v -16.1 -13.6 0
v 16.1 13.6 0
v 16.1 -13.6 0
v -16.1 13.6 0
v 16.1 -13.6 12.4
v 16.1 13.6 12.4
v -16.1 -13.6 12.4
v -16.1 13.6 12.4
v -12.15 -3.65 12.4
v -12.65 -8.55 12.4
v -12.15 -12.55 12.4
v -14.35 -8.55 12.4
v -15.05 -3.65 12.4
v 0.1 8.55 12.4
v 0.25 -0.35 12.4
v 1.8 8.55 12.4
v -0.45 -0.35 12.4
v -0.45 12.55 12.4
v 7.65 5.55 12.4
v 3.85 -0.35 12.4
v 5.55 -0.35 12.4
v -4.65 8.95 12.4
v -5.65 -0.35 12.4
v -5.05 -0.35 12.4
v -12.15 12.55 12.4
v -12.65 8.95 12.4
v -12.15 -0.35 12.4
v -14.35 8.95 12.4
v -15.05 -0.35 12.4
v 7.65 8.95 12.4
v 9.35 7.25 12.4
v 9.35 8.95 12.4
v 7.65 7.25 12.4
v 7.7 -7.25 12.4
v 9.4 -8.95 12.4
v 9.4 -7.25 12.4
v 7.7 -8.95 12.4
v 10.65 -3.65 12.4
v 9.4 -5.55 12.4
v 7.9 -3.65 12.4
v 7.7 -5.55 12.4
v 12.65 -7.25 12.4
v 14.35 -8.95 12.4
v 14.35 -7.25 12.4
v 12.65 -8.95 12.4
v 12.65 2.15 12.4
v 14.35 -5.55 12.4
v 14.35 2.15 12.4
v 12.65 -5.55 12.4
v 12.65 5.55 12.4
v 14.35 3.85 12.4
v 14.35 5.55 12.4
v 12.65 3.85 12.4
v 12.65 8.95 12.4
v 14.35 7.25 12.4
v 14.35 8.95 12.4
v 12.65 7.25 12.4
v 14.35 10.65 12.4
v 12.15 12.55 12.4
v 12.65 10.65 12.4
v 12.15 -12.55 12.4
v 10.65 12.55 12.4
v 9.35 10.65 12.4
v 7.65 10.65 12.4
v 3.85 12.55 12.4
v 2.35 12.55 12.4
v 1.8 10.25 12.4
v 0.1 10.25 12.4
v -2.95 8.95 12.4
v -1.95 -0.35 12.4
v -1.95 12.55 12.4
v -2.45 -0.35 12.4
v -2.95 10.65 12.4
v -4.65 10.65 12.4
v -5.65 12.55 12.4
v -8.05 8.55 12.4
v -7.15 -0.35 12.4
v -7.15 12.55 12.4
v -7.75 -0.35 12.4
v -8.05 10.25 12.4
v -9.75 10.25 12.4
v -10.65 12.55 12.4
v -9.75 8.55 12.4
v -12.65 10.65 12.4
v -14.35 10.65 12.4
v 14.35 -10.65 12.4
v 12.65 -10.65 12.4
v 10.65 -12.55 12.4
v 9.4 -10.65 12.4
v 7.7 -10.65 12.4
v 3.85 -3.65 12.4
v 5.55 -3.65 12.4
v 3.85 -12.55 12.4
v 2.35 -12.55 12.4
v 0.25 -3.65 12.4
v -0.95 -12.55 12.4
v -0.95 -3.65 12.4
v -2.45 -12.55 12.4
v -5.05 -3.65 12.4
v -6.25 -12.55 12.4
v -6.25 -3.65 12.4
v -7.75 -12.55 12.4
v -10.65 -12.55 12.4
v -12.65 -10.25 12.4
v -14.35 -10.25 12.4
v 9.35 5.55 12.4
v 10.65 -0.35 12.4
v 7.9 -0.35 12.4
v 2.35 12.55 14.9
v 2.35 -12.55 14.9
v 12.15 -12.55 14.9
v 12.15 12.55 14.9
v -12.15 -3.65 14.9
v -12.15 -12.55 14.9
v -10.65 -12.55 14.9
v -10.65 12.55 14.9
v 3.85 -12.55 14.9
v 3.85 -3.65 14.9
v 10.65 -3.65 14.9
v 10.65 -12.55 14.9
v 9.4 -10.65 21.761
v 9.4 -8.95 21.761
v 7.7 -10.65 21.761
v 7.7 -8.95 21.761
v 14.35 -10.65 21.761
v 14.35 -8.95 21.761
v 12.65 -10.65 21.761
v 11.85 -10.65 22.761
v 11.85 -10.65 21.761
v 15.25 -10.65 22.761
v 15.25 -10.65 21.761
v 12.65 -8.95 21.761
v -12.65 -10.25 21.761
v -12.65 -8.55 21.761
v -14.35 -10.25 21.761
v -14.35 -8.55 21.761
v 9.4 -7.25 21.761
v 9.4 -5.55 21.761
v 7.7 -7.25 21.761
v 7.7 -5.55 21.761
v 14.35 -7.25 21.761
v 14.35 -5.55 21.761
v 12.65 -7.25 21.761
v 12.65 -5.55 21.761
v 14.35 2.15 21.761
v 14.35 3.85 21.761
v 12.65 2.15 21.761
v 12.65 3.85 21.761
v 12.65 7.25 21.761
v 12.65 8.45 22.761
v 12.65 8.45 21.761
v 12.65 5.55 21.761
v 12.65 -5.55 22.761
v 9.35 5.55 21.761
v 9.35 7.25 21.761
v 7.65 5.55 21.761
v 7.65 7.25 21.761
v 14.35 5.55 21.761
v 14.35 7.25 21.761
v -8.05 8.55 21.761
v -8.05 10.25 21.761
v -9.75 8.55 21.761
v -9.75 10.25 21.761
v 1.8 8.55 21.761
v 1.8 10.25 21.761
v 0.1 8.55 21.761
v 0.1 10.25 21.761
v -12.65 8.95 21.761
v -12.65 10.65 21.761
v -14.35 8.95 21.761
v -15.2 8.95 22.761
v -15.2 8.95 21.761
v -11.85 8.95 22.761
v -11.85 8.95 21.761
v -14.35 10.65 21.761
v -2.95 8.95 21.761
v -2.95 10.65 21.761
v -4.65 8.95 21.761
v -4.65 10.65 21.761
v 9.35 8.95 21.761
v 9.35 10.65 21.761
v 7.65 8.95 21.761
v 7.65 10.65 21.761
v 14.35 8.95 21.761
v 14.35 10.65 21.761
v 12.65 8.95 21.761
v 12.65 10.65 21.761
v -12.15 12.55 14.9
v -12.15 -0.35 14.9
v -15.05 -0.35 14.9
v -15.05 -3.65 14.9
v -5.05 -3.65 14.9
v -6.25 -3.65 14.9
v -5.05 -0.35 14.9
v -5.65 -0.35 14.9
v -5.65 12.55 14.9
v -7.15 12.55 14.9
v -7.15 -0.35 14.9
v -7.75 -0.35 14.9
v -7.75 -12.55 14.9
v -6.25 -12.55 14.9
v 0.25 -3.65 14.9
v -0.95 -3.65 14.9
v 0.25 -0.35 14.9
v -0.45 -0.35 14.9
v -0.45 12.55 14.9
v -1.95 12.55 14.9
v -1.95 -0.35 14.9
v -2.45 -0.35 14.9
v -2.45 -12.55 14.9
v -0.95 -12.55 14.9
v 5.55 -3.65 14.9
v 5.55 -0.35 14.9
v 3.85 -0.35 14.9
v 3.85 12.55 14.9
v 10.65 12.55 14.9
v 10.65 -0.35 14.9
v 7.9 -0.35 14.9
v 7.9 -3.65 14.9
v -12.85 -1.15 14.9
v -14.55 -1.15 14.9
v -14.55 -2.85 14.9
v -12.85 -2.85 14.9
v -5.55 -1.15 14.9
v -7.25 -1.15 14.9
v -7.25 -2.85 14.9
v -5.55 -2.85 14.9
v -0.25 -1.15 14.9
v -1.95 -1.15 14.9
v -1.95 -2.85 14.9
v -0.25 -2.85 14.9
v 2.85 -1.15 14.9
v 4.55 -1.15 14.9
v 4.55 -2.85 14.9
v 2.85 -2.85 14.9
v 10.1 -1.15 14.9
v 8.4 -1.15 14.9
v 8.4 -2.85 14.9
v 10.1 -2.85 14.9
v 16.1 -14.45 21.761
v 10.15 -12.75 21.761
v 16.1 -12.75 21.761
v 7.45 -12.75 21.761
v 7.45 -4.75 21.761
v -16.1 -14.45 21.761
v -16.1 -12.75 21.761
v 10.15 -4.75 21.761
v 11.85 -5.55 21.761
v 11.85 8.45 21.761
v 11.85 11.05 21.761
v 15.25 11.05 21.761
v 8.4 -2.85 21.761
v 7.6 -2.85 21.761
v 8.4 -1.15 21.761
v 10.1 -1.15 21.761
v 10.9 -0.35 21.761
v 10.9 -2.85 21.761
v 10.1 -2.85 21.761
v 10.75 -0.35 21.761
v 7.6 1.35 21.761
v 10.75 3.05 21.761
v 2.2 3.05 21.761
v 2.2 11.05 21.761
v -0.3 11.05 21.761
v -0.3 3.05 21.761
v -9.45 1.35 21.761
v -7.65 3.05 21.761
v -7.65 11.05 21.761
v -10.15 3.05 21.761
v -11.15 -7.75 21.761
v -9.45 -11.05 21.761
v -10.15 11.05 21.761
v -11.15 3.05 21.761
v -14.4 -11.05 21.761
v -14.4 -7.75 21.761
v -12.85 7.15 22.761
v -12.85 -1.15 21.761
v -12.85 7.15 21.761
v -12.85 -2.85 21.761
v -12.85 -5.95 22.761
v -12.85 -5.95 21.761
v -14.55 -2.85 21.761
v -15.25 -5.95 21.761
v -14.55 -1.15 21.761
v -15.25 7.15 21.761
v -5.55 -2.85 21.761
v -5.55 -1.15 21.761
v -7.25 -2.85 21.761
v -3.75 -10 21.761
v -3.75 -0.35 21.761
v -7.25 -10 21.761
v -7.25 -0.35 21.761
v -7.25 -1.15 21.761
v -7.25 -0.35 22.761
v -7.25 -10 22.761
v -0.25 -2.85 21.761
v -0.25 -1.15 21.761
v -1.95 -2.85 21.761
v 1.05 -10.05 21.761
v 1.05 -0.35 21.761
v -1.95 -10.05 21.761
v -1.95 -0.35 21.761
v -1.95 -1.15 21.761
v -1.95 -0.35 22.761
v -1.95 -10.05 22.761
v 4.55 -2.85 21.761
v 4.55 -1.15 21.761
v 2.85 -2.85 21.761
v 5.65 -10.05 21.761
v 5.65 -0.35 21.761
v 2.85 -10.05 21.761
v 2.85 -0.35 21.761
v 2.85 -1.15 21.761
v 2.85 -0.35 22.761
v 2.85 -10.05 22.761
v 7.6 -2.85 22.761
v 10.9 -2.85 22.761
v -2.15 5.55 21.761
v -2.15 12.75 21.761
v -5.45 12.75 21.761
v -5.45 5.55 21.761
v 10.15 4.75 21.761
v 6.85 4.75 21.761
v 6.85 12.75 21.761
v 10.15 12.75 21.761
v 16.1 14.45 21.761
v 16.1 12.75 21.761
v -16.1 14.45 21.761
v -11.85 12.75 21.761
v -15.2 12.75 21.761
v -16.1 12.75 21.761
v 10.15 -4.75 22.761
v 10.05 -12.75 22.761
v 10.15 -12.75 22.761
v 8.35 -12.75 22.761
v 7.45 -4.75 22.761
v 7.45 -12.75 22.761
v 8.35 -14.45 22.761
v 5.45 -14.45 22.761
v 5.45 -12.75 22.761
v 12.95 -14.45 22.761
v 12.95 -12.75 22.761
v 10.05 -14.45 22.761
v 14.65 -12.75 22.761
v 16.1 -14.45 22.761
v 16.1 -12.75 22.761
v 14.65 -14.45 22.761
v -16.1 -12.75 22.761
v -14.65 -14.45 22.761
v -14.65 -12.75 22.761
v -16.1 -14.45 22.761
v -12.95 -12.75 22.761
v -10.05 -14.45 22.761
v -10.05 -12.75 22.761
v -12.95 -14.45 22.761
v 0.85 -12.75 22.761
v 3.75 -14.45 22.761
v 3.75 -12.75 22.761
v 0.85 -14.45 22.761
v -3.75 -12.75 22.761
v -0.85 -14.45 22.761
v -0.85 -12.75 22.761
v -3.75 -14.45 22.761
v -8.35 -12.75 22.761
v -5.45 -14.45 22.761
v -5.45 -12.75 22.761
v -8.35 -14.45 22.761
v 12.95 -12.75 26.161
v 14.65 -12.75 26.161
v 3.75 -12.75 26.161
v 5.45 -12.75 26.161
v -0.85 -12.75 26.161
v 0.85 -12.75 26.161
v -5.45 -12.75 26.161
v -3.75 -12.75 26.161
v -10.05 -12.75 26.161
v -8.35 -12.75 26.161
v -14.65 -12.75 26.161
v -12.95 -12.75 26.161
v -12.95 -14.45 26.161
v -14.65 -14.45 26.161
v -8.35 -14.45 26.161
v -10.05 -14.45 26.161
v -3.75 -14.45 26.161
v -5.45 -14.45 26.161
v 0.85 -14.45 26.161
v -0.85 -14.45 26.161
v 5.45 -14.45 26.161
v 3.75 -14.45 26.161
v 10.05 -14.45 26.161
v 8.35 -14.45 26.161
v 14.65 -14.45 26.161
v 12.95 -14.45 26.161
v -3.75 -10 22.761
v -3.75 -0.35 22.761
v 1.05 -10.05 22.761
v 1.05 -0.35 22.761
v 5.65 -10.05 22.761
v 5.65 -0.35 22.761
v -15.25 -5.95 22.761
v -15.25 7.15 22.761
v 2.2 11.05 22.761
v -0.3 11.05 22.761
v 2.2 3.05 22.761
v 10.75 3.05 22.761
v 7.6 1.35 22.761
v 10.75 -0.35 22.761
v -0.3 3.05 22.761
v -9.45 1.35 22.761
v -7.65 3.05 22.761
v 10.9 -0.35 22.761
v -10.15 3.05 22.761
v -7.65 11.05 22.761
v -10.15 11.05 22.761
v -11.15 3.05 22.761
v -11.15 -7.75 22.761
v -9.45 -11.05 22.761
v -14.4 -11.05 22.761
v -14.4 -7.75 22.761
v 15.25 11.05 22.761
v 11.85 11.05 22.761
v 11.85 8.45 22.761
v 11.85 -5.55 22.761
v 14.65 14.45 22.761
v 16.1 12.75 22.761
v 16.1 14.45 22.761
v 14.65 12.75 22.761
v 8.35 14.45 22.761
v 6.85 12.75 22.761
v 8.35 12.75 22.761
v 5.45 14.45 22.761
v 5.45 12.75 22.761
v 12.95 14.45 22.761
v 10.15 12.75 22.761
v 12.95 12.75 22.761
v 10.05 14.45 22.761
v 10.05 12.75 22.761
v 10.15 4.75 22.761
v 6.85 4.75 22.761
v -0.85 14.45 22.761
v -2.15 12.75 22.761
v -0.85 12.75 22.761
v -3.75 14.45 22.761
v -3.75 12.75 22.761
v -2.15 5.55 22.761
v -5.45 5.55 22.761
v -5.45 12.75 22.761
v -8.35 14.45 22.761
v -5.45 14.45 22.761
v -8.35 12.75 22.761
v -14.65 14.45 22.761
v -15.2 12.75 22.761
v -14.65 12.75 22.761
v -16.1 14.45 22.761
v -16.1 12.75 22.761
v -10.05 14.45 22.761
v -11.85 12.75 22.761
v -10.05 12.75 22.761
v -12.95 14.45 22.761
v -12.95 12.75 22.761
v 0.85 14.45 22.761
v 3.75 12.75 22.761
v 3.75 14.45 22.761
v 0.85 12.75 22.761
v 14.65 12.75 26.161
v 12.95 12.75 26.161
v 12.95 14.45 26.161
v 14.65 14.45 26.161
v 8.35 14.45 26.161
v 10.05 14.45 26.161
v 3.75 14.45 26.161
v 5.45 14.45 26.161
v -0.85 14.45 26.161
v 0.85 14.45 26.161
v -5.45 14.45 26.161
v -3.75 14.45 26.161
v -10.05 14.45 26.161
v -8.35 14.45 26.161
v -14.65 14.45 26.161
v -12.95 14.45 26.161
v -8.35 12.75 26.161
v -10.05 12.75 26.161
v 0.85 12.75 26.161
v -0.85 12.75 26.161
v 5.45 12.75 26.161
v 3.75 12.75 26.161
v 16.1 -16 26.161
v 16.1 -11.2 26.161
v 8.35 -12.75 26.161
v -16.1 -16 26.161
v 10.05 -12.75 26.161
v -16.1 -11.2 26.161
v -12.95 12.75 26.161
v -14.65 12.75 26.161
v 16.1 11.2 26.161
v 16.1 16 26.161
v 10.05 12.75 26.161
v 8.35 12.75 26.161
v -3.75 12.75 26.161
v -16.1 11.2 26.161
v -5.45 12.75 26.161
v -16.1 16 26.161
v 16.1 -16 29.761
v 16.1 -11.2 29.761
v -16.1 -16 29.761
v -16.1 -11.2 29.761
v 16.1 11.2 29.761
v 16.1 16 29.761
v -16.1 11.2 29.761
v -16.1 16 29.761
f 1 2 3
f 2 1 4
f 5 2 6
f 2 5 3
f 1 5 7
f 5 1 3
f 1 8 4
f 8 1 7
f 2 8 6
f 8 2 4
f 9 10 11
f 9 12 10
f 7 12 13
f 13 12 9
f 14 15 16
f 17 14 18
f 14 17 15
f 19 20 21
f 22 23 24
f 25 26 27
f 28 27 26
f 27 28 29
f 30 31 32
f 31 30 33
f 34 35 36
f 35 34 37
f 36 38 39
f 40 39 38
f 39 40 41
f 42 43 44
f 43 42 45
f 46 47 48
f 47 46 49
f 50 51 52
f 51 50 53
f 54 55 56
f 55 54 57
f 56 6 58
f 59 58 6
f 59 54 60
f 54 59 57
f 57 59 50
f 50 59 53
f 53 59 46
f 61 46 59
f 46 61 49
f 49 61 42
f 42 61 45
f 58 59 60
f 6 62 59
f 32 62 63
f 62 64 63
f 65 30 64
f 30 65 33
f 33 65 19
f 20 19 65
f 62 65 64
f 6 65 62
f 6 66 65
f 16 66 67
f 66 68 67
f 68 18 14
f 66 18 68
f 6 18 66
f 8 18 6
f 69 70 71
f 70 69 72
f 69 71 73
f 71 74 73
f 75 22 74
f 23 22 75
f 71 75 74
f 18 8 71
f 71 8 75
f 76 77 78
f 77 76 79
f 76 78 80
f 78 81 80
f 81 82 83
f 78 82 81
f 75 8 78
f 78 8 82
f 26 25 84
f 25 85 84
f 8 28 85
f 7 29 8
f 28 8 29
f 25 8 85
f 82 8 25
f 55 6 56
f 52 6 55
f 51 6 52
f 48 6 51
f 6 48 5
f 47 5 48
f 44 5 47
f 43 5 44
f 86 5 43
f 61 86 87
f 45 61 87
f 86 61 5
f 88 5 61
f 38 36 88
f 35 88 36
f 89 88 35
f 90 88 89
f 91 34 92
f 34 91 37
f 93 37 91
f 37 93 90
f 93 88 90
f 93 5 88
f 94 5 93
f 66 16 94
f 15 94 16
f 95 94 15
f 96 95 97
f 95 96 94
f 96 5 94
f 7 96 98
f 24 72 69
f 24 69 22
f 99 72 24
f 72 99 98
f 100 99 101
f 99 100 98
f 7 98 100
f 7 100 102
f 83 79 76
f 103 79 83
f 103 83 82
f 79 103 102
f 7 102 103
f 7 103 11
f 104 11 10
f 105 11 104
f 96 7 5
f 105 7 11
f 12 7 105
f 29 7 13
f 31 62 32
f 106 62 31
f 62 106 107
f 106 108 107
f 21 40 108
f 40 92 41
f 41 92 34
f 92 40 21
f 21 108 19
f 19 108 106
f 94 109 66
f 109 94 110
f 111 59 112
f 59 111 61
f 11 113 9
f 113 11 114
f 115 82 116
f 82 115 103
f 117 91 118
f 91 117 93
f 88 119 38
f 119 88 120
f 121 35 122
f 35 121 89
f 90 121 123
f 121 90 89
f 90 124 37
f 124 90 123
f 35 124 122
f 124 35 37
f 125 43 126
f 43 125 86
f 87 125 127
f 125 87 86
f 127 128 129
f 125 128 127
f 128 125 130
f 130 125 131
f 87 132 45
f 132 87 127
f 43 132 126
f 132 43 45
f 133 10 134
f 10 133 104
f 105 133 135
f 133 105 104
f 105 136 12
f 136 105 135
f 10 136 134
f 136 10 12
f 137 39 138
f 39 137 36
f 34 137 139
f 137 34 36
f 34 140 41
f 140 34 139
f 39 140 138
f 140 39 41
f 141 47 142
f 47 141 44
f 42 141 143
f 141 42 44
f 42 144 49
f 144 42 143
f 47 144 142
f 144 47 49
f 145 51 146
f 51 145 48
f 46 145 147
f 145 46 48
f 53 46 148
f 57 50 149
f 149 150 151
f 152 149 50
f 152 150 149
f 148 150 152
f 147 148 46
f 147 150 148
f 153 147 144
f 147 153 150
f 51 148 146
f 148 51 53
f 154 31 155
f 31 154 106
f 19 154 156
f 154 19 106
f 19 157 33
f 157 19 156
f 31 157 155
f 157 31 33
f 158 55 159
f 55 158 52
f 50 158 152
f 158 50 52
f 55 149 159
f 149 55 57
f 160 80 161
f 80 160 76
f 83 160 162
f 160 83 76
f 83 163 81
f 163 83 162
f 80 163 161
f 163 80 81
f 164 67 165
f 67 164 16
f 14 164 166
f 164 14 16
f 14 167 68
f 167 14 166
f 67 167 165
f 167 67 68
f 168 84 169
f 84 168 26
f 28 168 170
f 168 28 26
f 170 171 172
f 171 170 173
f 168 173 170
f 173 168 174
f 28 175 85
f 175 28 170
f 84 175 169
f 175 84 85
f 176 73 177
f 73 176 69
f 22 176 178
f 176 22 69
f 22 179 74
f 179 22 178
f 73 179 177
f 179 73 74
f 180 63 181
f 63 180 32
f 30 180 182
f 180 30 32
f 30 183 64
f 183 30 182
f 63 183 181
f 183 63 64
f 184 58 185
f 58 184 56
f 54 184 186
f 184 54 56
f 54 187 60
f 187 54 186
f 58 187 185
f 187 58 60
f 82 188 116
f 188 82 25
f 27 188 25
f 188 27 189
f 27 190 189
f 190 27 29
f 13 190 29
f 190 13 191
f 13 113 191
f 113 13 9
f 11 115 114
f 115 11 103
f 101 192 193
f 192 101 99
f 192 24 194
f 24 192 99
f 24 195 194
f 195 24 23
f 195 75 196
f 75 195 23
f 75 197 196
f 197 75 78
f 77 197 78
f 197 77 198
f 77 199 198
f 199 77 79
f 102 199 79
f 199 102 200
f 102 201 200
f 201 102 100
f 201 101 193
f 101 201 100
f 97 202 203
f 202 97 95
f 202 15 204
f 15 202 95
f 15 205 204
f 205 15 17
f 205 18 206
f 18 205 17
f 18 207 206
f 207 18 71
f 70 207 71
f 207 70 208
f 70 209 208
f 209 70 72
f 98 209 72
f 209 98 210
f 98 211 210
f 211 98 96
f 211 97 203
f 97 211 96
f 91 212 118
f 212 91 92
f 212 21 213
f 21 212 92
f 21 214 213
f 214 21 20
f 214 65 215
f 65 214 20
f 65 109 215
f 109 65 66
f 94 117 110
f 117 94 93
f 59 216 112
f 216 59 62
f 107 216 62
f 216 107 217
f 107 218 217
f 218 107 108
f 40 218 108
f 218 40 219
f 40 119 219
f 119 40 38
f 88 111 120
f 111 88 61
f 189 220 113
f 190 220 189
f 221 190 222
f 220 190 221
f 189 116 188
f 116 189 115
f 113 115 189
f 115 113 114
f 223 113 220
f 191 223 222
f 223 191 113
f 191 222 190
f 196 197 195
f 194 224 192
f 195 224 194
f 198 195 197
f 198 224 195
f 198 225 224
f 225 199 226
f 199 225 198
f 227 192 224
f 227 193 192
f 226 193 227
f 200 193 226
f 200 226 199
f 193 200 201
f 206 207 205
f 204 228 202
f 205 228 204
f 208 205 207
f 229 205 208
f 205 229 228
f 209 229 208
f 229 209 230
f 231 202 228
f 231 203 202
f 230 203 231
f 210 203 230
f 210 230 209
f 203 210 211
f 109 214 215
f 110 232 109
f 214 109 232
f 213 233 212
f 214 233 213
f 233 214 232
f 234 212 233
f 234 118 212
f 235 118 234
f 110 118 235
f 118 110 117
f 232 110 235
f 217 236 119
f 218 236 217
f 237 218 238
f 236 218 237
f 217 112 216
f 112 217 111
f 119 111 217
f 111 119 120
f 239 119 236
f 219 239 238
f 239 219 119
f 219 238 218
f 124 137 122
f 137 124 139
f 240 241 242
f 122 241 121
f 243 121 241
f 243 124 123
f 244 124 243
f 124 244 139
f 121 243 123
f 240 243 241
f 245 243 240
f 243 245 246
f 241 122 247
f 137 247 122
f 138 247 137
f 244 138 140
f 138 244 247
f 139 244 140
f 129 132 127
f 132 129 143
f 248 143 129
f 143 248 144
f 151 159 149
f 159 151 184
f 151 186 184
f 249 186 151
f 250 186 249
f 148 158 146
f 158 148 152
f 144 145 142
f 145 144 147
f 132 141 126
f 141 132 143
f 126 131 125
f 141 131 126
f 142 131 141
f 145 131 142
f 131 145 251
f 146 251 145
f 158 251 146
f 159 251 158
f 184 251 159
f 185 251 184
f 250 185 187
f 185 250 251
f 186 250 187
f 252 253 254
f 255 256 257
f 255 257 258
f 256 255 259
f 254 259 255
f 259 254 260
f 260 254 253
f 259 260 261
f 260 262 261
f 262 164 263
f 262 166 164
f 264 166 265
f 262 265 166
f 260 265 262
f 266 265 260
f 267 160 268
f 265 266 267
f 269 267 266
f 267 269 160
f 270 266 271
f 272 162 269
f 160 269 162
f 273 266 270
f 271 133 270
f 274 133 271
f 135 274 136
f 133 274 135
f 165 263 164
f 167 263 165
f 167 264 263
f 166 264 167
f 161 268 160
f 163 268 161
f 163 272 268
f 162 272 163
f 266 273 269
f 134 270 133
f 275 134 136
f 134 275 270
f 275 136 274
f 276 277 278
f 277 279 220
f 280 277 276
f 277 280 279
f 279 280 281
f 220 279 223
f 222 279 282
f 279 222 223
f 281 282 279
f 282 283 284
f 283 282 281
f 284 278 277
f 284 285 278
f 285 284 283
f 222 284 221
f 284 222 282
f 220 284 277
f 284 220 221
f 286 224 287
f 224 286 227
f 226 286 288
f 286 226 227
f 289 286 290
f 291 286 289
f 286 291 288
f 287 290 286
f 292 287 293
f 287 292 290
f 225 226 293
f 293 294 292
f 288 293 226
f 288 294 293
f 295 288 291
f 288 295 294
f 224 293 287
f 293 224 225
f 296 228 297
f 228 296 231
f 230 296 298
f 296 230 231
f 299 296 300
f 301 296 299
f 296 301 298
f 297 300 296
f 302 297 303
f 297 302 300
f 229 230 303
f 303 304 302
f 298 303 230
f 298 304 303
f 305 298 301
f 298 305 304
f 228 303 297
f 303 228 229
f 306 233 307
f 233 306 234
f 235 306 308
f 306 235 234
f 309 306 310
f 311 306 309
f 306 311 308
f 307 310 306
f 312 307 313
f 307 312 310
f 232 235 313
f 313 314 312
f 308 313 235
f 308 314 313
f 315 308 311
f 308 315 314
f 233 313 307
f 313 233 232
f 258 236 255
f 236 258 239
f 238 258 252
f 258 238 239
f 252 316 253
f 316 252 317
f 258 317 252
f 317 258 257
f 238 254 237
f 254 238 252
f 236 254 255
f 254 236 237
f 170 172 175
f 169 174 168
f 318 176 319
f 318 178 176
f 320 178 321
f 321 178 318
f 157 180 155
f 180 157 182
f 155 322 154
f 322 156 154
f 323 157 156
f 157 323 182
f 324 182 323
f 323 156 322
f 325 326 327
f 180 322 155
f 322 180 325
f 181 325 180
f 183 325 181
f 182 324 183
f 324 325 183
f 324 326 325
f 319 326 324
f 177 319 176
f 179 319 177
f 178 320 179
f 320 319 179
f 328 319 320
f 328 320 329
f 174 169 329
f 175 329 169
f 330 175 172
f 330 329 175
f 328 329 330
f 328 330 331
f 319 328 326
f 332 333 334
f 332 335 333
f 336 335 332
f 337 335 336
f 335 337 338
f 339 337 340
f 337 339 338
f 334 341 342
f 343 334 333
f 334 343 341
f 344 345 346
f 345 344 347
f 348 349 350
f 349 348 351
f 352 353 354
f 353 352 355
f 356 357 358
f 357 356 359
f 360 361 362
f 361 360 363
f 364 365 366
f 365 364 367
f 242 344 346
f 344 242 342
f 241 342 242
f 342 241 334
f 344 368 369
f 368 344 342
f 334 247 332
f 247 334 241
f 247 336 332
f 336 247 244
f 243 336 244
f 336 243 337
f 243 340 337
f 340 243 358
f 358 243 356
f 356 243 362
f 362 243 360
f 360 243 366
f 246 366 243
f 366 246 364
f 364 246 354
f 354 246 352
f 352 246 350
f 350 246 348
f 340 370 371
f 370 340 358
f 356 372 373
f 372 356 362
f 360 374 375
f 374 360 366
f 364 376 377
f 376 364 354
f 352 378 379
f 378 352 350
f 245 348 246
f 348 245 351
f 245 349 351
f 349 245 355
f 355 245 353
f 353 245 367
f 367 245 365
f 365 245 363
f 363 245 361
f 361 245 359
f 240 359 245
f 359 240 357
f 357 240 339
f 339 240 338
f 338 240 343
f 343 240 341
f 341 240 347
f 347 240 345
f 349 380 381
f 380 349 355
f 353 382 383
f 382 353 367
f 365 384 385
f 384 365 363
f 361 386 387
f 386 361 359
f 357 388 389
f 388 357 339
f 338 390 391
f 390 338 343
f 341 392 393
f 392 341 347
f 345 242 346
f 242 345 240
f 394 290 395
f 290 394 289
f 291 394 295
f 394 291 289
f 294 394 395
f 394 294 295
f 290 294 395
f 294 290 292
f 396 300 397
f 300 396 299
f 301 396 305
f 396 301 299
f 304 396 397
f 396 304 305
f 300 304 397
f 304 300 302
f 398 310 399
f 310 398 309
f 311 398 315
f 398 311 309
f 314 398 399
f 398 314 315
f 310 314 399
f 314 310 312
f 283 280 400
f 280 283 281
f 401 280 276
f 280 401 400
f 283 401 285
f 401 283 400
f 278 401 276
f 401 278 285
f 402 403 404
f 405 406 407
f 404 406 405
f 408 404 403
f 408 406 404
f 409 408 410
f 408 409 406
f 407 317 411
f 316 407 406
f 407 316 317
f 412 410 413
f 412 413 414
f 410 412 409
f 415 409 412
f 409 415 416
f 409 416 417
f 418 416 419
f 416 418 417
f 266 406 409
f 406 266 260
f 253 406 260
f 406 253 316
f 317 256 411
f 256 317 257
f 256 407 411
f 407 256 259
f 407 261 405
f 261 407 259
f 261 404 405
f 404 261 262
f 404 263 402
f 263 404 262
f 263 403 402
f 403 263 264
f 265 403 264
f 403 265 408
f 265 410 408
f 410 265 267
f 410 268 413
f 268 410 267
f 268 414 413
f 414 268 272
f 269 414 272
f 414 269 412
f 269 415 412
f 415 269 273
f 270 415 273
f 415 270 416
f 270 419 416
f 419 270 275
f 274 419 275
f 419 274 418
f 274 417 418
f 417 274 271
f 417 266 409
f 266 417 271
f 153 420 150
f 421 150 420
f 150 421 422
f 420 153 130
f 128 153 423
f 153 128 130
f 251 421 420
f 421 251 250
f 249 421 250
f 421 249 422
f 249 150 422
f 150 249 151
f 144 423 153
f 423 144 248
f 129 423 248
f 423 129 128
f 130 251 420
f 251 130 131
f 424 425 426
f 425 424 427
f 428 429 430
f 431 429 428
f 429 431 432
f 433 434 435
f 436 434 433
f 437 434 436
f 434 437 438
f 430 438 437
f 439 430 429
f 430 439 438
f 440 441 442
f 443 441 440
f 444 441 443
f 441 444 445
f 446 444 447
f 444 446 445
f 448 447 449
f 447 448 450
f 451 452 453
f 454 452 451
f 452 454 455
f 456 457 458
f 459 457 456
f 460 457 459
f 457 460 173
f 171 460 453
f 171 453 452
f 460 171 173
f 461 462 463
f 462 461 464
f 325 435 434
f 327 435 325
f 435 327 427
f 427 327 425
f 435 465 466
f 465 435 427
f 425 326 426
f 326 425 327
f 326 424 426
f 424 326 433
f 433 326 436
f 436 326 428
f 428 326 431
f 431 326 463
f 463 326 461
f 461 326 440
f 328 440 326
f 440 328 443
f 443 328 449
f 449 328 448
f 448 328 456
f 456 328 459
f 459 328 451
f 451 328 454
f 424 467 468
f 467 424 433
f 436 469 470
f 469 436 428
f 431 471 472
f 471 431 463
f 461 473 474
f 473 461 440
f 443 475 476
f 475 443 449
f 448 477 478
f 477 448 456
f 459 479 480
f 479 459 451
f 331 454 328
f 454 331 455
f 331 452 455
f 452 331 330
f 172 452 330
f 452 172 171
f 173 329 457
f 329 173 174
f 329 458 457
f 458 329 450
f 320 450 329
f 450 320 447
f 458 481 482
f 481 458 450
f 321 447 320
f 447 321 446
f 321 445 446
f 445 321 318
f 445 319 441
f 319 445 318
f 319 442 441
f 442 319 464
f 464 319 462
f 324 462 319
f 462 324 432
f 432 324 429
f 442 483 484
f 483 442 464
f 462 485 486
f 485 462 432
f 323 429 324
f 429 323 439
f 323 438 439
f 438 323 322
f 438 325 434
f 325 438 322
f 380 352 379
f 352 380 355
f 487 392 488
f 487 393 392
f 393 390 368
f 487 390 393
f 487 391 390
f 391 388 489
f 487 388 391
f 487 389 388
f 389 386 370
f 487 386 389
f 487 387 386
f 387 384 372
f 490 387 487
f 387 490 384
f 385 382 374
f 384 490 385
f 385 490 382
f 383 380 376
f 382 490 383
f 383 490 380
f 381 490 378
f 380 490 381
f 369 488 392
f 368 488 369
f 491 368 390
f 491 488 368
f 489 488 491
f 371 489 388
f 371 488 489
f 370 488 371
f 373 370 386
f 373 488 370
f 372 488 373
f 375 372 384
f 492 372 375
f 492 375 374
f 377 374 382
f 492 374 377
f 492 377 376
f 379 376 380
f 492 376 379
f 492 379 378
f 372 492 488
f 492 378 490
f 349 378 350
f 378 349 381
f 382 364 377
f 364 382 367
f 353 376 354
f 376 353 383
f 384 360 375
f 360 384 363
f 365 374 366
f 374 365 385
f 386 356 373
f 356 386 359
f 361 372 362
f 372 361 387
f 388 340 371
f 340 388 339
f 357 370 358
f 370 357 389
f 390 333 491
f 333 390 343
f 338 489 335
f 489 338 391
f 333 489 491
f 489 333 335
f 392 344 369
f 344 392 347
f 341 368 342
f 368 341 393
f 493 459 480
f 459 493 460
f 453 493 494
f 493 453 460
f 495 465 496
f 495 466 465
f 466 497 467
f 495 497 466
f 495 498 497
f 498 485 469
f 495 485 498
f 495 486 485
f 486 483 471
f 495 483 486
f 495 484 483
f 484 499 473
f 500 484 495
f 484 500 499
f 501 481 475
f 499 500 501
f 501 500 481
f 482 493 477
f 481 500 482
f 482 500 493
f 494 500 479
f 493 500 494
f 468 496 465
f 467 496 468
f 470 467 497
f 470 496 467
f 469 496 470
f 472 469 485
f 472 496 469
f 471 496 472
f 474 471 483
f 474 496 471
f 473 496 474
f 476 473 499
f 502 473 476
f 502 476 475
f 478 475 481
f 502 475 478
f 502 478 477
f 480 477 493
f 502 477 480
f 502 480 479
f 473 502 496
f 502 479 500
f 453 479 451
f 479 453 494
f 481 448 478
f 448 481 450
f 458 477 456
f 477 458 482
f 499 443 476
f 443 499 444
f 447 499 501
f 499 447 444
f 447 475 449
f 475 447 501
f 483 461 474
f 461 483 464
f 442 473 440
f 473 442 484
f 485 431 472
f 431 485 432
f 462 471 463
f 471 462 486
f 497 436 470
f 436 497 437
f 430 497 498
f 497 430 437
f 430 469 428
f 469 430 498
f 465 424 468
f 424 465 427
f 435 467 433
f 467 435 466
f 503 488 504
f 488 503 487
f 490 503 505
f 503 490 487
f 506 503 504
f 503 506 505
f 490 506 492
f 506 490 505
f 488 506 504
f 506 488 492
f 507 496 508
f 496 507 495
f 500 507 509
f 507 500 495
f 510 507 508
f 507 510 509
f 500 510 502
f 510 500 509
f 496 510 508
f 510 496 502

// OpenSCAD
// Generated by SolidPython 0.4.2 on 2020-09-29 23:20:11
//!OpenSCAD

scale(v = 0.0100000000) {
	translate(v = [-1610, -1360, 0]) {
		union() {
			color(c = [0.4000000000, 0.4000000000, 0.4000000000]) {
				translate(v = [0, 0, 0]) {
					linear_extrude(height = 1000.0000000000) {
						polygon(paths = [[0, 1, 2, 3]], points = [[0, 0], [0, 2720], [3220, 2720], [3220, 0]]);
					}
				}
			}
			color(c = [0.2000000000, 0.6000000000, 0.2000000000]) {
				translate(v = [0, 0, 1000.0000000000]) {
					linear_extrude(height = 120.0000000000) {
						polygon(paths = [[0, 1, 2, 3]], points = [[0, 1305], [0, 2720], [3220, 2720], [3220, 1305]]);
					}
				}
			}
			color(c = [0.4000000000, 0.4000000000, 0.4000000000]) {
				translate(v = [0, 0, 1000.0000000000]) {
					linear_extrude(height = 120.0000000000) {
						polygon(paths = [[0, 1, 2, 3]], points = [[0, 0], [0, 1305], [3220, 1305], [3220, 0]]);
					}
				}
			}
			color(c = [0.9000000000, 0.6000000000, 0.6000000000]) {
				translate(v = [0, 0, 1120.0000000000]) {
					linear_extrude(height = 120.0000000000) {
						polygon(paths = [[0, 1, 2, 3]], points = [[135, 2065], [135, 2485], [395, 2485], [395, 2065]]);
					}
				}
			}
			color(c = [0.9000000000, 0.6000000000, 0.6000000000]) {
				translate(v = [0, 0, 1120.0000000000]) {
					linear_extrude(height = 120.0000000000) {
						polygon(paths = [[0, 1, 2, 3]], points = [[545, 2065], [545, 2485], [895, 2485], [895, 2065]]);
					}
				}
			}
			color(c = [0.9000000000, 0.6000000000, 0.6000000000]) {
				translate(v = [0, 0, 1120.0000000000]) {
					linear_extrude(height = 120.0000000000) {
						polygon(paths = [[0, 1, 2, 3]], points = [[1045, 2065], [1045, 2485], [1415, 2485], [1415, 2065]]);
					}
				}
			}
			color(c = [0.9000000000, 0.6000000000, 0.6000000000]) {
				translate(v = [0, 0, 1120.0000000000]) {
					linear_extrude(height = 120.0000000000) {
						polygon(paths = [[0, 1, 2, 3]], points = [[1565, 2065], [1565, 2485], [1845, 2485], [1845, 2065]]);
					}
				}
			}
			color(c = [0.9000000000, 0.6000000000, 0.6000000000]) {
				translate(v = [0, 0, 1120.0000000000]) {
					linear_extrude(height = 120.0000000000) {
						polygon(paths = [[0, 1, 2, 3, 4, 5]], points = [[2090, 1485], [2090, 2065], [1995, 2065], [1995, 2485], [2675, 2485], [2675, 1485]]);
					}
				}
			}
			color(c = [0.9000000000, 0.6000000000, 0.6000000000]) {
				translate(v = [0, 0, 1120.0000000000]) {
					linear_extrude(height = 120.0000000000) {
						polygon(paths = [[0, 1, 2, 3]], points = [[2825, 1485], [2825, 2485], [3085, 2485], [3085, 1485]]);
					}
				}
			}
			color(c = [0.9000000000, 0.6000000000, 0.9000000000]) {
				translate(v = [0, 0, 1120.0000000000]) {
					linear_extrude(height = 120.0000000000) {
						polygon(paths = [[0, 1, 2, 3]], points = [[135, 235], [135, 655], [395, 655], [395, 235]]);
					}
				}
			}
			color(c = [0.9000000000, 0.6000000000, 0.9000000000]) {
				translate(v = [0, 0, 1120.0000000000]) {
					linear_extrude(height = 120.0000000000) {
						polygon(paths = [[0, 1, 2, 3]], points = [[545, 235], [545, 655], [835, 655], [835, 235]]);
					}
				}
			}
			color(c = [0.9000000000, 0.6000000000, 0.9000000000]) {
				translate(v = [0, 0, 1120.0000000000]) {
					linear_extrude(height = 120.0000000000) {
						polygon(paths = [[0, 1, 2, 3]], points = [[985, 235], [985, 655], [1365, 655], [1365, 235]]);
					}
				}
			}
			color(c = [0.9000000000, 0.6000000000, 0.9000000000]) {
				translate(v = [0, 0, 1120.0000000000]) {
					linear_extrude(height = 120.0000000000) {
						polygon(paths = [[0, 1, 2, 3]], points = [[1515, 235], [1515, 655], [1845, 655], [1845, 235]]);
					}
				}
			}
			color(c = [0.9000000000, 0.6000000000, 0.9000000000]) {
				translate(v = [0, 0, 1120.0000000000]) {
					linear_extrude(height = 120.0000000000) {
						polygon(paths = [[0, 1, 2, 3, 4, 5]], points = [[1995, 235], [1995, 655], [2210, 655], [2210, 885], [2675, 885], [2675, 235]]);
					}
				}
			}
			color(c = [0.9000000000, 0.6000000000, 0.9000000000]) {
				translate(v = [0, 0, 1120.0000000000]) {
					linear_extrude(height = 120.0000000000) {
						polygon(paths = [[0, 1, 2, 3]], points = [[2825, 235], [2825, 885], [3085, 885], [3085, 235]]);
					}
				}
			}
			color(c = [0.2000000000, 0.6000000000, 0.2000000000]) {
				translate(v = [0, 0, 1120.0000000000]) {
					linear_extrude(height = 120.0000000000) {
						difference() {
							polygon(paths = [[0, 1, 2, 3]], points = [[0, 1305], [0, 2720], [3220, 2720], [3220, 1305]]);
							polygon(paths = [[0, 1, 2, 3]], points = [[2825, 1485], [3085, 1485], [3085, 2485], [2825, 2485]]);
							polygon(paths = [[0, 1, 2, 3]], points = [[135, 2065], [395, 2065], [395, 2485], [135, 2485]]);
							polygon(paths = [[0, 1, 2, 3]], points = [[545, 2065], [895, 2065], [895, 2485], [545, 2485]]);
							polygon(paths = [[0, 1, 2, 3]], points = [[1045, 2065], [1415, 2065], [1415, 2485], [1045, 2485]]);
							polygon(paths = [[0, 1, 2, 3]], points = [[1565, 2065], [1845, 2065], [1845, 2485], [1565, 2485]]);
							polygon(paths = [[0, 1, 2, 3, 4, 5]], points = [[2090, 1485], [2675, 1485], [2675, 2485], [1995, 2485], [1995, 2065], [2090, 2065]]);
						}
					}
				}
			}
			color(c = [0.4000000000, 0.4000000000, 0.4000000000]) {
				translate(v = [0, 0, 1120.0000000000]) {
					linear_extrude(height = 120.0000000000) {
						difference() {
							polygon(paths = [[0, 1, 2, 3]], points = [[0, 0], [0, 1305], [3220, 1305], [3220, 0]]);
							polygon(paths = [[0, 1, 2, 3]], points = [[135, 235], [395, 235], [395, 655], [135, 655]]);
							polygon(paths = [[0, 1, 2, 3]], points = [[545, 235], [835, 235], [835, 655], [545, 655]]);
							polygon(paths = [[0, 1, 2, 3]], points = [[985, 235], [1365, 235], [1365, 655], [985, 655]]);
							polygon(paths = [[0, 1, 2, 3]], points = [[1515, 235], [1845, 235], [1845, 655], [1515, 655]]);
							polygon(paths = [[0, 1, 2, 3]], points = [[2825, 235], [3085, 235], [3085, 885], [2825, 885]]);
							polygon(paths = [[0, 1, 2, 3, 4, 5]], points = [[1995, 235], [2675, 235], [2675, 885], [2210, 885], [2210, 655], [1995, 655]]);
						}
					}
				}
			}
			color(c = [0.1000000000, 0.1000000000, 0.1000000000]) {
				translate(v = [0, 0, 1240.0000000000]) {
					linear_extrude(height = 70.0000000000) {
						polygon(paths = [[0, 1, 2, 3]], points = [[2380, 295], [2380, 465], [2550, 465], [2550, 295]]);
					}
				}
			}
			color(c = [0.1000000000, 0.1000000000, 0.1000000000]) {
				translate(v = [0, 0, 1240.0000000000]) {
					linear_extrude(height = 70.0000000000) {
						polygon(paths = [[0, 1, 2, 3]], points = [[2875, 295], [2875, 465], [3045, 465], [3045, 295]]);
					}
				}
			}
			color(c = [0.1000000000, 0.1000000000, 0.1000000000]) {
				translate(v = [0, 0, 1240.0000000000]) {
					linear_extrude(height = 70.0000000000) {
						polygon(paths = [[0, 1, 2, 3]], points = [[175, 335], [175, 505], [345, 505], [345, 335]]);
					}
				}
			}
			color(c = [0.1000000000, 0.1000000000, 0.1000000000]) {
				translate(v = [0, 0, 1240.0000000000]) {
					linear_extrude(height = 70.0000000000) {
						polygon(paths = [[0, 1, 2, 3]], points = [[2380, 635], [2380, 805], [2550, 805], [2550, 635]]);
					}
				}
			}
			color(c = [0.1000000000, 0.1000000000, 0.1000000000]) {
				translate(v = [0, 0, 1240.0000000000]) {
					linear_extrude(height = 70.0000000000) {
						polygon(paths = [[0, 1, 2, 3]], points = [[2875, 635], [2875, 805], [3045, 805], [3045, 635]]);
					}
				}
			}
			color(c = [0.1000000000, 0.1000000000, 0.1000000000]) {
				translate(v = [0, 0, 1240.0000000000]) {
					linear_extrude(height = 70.0000000000) {
						polygon(paths = [[0, 1, 2, 3]], points = [[2875, 1575], [2875, 1745], [3045, 1745], [3045, 1575]]);
					}
				}
			}
			color(c = [0.1000000000, 0.1000000000, 0.1000000000]) {
				translate(v = [0, 0, 1240.0000000000]) {
					linear_extrude(height = 70.0000000000) {
						polygon(paths = [[0, 1, 2, 3]], points = [[2375, 1915], [2375, 2085], [2545, 2085], [2545, 1915]]);
					}
				}
			}
			color(c = [0.1000000000, 0.1000000000, 0.1000000000]) {
				translate(v = [0, 0, 1240.0000000000]) {
					linear_extrude(height = 70.0000000000) {
						polygon(paths = [[0, 1, 2, 3]], points = [[2875, 1915], [2875, 2085], [3045, 2085], [3045, 1915]]);
					}
				}
			}
			color(c = [0.1000000000, 0.1000000000, 0.1000000000]) {
				translate(v = [0, 0, 1240.0000000000]) {
					linear_extrude(height = 70.0000000000) {
						polygon(paths = [[0, 1, 2, 3]], points = [[635, 2215], [635, 2385], [805, 2385], [805, 2215]]);
					}
				}
			}
			color(c = [0.1000000000, 0.1000000000, 0.1000000000]) {
				translate(v = [0, 0, 1240.0000000000]) {
					linear_extrude(height = 70.0000000000) {
						polygon(paths = [[0, 1, 2, 3]], points = [[1620, 2215], [1620, 2385], [1790, 2385], [1790, 2215]]);
					}
				}
			}
			color(c = [0.1000000000, 0.1000000000, 0.1000000000]) {
				translate(v = [0, 0, 1240.0000000000]) {
					linear_extrude(height = 70.0000000000) {
						polygon(paths = [[0, 1, 2, 3]], points = [[175, 2255], [175, 2425], [345, 2425], [345, 2255]]);
					}
				}
			}
			color(c = [0.1000000000, 0.1000000000, 0.1000000000]) {
				translate(v = [0, 0, 1240.0000000000]) {
					linear_extrude(height = 70.0000000000) {
						polygon(paths = [[0, 1, 2, 3]], points = [[1145, 2255], [1145, 2425], [1315, 2425], [1315, 2255]]);
					}
				}
			}
			color(c = [0.1000000000, 0.1000000000, 0.1000000000]) {
				translate(v = [0, 0, 1240.0000000000]) {
					linear_extrude(height = 70.0000000000) {
						polygon(paths = [[0, 1, 2, 3]], points = [[2375, 2255], [2375, 2425], [2545, 2425], [2545, 2255]]);
					}
				}
			}
			color(c = [0.1000000000, 0.1000000000, 0.1000000000]) {
				translate(v = [0, 0, 1240.0000000000]) {
					linear_extrude(height = 70.0000000000) {
						polygon(paths = [[0, 1, 2, 3]], points = [[2875, 2255], [2875, 2425], [3045, 2425], [3045, 2255]]);
					}
				}
			}
			color(c = [1.0000000000, 1.0000000000, 1.0000000000]) {
				translate(v = [0, 0, 1240.0000000000]) {
					linear_extrude(height = 70.0000000000) {
						polygon(paths = [[0, 1, 2, 3, 4, 5, 6, 7]], points = [[395, 105], [395, 995], [105, 995], [105, 1325], [395, 1325], [395, 2615], [545, 2615], [545, 105]]);
					}
				}
			}
			color(c = [1.0000000000, 1.0000000000, 1.0000000000]) {
				translate(v = [0, 0, 1240.0000000000]) {
					linear_extrude(height = 70.0000000000) {
						polygon(paths = [[0, 1, 2, 3, 4, 5, 6, 7, 8, 9]], points = [[835, 105], [835, 1325], [895, 1325], [895, 2615], [1045, 2615], [1045, 1325], [1105, 1325], [1105, 995], [985, 995], [985, 105]]);
					}
				}
			}
			color(c = [1.0000000000, 1.0000000000, 1.0000000000]) {
				translate(v = [0, 0, 1240.0000000000]) {
					linear_extrude(height = 70.0000000000) {
						polygon(paths = [[0, 1, 2, 3, 4, 5, 6, 7, 8, 9]], points = [[1365, 105], [1365, 1325], [1415, 1325], [1415, 2615], [1565, 2615], [1565, 1325], [1635, 1325], [1635, 995], [1515, 995], [1515, 105]]);
					}
				}
			}
			color(c = [1.0000000000, 1.0000000000, 1.0000000000]) {
				translate(v = [0, 0, 1240.0000000000]) {
					linear_extrude(height = 70.0000000000) {
						polygon(paths = [[0, 1, 2, 3, 4, 5, 6, 7]], points = [[1845, 105], [1845, 2615], [1995, 2615], [1995, 1325], [2165, 1325], [2165, 995], [1995, 995], [1995, 105]]);
					}
				}
			}
			color(c = [1.0000000000, 1.0000000000, 1.0000000000]) {
				translate(v = [0, 0, 1240.0000000000]) {
					linear_extrude(height = 70.0000000000) {
						polygon(paths = [[0, 1, 2, 3, 4, 5, 6, 7]], points = [[2675, 105], [2675, 995], [2400, 995], [2400, 1325], [2675, 1325], [2675, 2615], [2825, 2615], [2825, 105]]);
					}
				}
			}
			color(c = [0.1000000000, 0.1000000000, 0.1000000000]) {
				translate(v = [0, 0, 1310.0000000000]) {
					linear_extrude(height = 180.0000000000) {
						polygon(paths = [[0, 1, 2, 3]], points = [[2380, 295], [2380, 465], [2550, 465], [2550, 295]]);
					}
				}
			}
			color(c = [0.1000000000, 0.1000000000, 0.1000000000]) {
				translate(v = [0, 0, 1310.0000000000]) {
					linear_extrude(height = 180.0000000000) {
						polygon(paths = [[0, 1, 2, 3]], points = [[2875, 295], [2875, 465], [3045, 465], [3045, 295]]);
					}
				}
			}
			color(c = [0.1000000000, 0.1000000000, 0.1000000000]) {
				translate(v = [0, 0, 1310.0000000000]) {
					linear_extrude(height = 180.0000000000) {
						polygon(paths = [[0, 1, 2, 3]], points = [[175, 335], [175, 505], [345, 505], [345, 335]]);
					}
				}
			}
			color(c = [0.1000000000, 0.1000000000, 0.1000000000]) {
				translate(v = [0, 0, 1310.0000000000]) {
					linear_extrude(height = 180.0000000000) {
						polygon(paths = [[0, 1, 2, 3]], points = [[2380, 635], [2380, 805], [2550, 805], [2550, 635]]);
					}
				}
			}
			color(c = [0.1000000000, 0.1000000000, 0.1000000000]) {
				translate(v = [0, 0, 1310.0000000000]) {
					linear_extrude(height = 180.0000000000) {
						polygon(paths = [[0, 1, 2, 3]], points = [[2875, 635], [2875, 805], [3045, 805], [3045, 635]]);
					}
				}
			}
			color(c = [0.1000000000, 0.1000000000, 0.1000000000]) {
				translate(v = [0, 0, 1310.0000000000]) {
					linear_extrude(height = 180.0000000000) {
						polygon(paths = [[0, 1, 2, 3]], points = [[2875, 1575], [2875, 1745], [3045, 1745], [3045, 1575]]);
					}
				}
			}
			color(c = [0.1000000000, 0.1000000000, 0.1000000000]) {
				translate(v = [0, 0, 1310.0000000000]) {
					linear_extrude(height = 180.0000000000) {
						polygon(paths = [[0, 1, 2, 3]], points = [[2375, 1915], [2375, 2085], [2545, 2085], [2545, 1915]]);
					}
				}
			}
			color(c = [0.1000000000, 0.1000000000, 0.1000000000]) {
				translate(v = [0, 0, 1310.0000000000]) {
					linear_extrude(height = 180.0000000000) {
						polygon(paths = [[0, 1, 2, 3]], points = [[2875, 1915], [2875, 2085], [3045, 2085], [3045, 1915]]);
					}
				}
			}
			color(c = [0.1000000000, 0.1000000000, 0.1000000000]) {
				translate(v = [0, 0, 1310.0000000000]) {
					linear_extrude(height = 180.0000000000) {
						polygon(paths = [[0, 1, 2, 3]], points = [[635, 2215], [635, 2385], [805, 2385], [805, 2215]]);
					}
				}
			}
			color(c = [0.1000000000, 0.1000000000, 0.1000000000]) {
				translate(v = [0, 0, 1310.0000000000]) {
					linear_extrude(height = 180.0000000000) {
						polygon(paths = [[0, 1, 2, 3]], points = [[1620, 2215], [1620, 2385], [1790, 2385], [1790, 2215]]);
					}
				}
			}
			color(c = [0.1000000000, 0.1000000000, 0.1000000000]) {
				translate(v = [0, 0, 1310.0000000000]) {
					linear_extrude(height = 180.0000000000) {
						polygon(paths = [[0, 1, 2, 3]], points = [[175, 2255], [175, 2425], [345, 2425], [345, 2255]]);
					}
				}
			}
			color(c = [0.1000000000, 0.1000000000, 0.1000000000]) {
				translate(v = [0, 0, 1310.0000000000]) {
					linear_extrude(height = 180.0000000000) {
						polygon(paths = [[0, 1, 2, 3]], points = [[1145, 2255], [1145, 2425], [1315, 2425], [1315, 2255]]);
					}
				}
			}
			color(c = [0.1000000000, 0.1000000000, 0.1000000000]) {
				translate(v = [0, 0, 1310.0000000000]) {
					linear_extrude(height = 180.0000000000) {
						polygon(paths = [[0, 1, 2, 3]], points = [[2375, 2255], [2375, 2425], [2545, 2425], [2545, 2255]]);
					}
				}
			}
			color(c = [0.1000000000, 0.1000000000, 0.1000000000]) {
				translate(v = [0, 0, 1310.0000000000]) {
					linear_extrude(height = 180.0000000000) {
						polygon(paths = [[0, 1, 2, 3]], points = [[2875, 2255], [2875, 2425], [3045, 2425], [3045, 2255]]);
					}
				}
			}
			color(c = [0.7000000000, 0, 0]) {
				translate(v = [0, 0, 1310.0000000000]) {
					linear_extrude(height = 180.0000000000) {
						polygon(paths = [[0, 1, 2, 3, 4, 5, 6, 7]], points = [[395, 105], [395, 995], [105, 995], [105, 1325], [395, 1325], [395, 2615], [545, 2615], [545, 105]]);
					}
				}
			}
			color(c = [0.7000000000, 0, 0]) {
				translate(v = [0, 0, 1310.0000000000]) {
					linear_extrude(height = 180.0000000000) {
						polygon(paths = [[0, 1, 2, 3, 4, 5, 6, 7, 8, 9]], points = [[835, 105], [835, 1325], [895, 1325], [895, 2615], [1045, 2615], [1045, 1325], [1105, 1325], [1105, 995], [985, 995], [985, 105]]);
					}
				}
			}
			color(c = [0.7000000000, 0, 0]) {
				translate(v = [0, 0, 1310.0000000000]) {
					linear_extrude(height = 180.0000000000) {
						polygon(paths = [[0, 1, 2, 3, 4, 5, 6, 7, 8, 9]], points = [[1365, 105], [1365, 1325], [1415, 1325], [1415, 2615], [1565, 2615], [1565, 1325], [1635, 1325], [1635, 995], [1515, 995], [1515, 105]]);
					}
				}
			}
			color(c = [0.7000000000, 0, 0]) {
				translate(v = [0, 0, 1310.0000000000]) {
					linear_extrude(height = 180.0000000000) {
						polygon(paths = [[0, 1, 2, 3, 4, 5, 6, 7]], points = [[1845, 105], [1845, 2615], [1995, 2615], [1995, 1325], [2165, 1325], [2165, 995], [1995, 995], [1995, 105]]);
					}
				}
			}
			color(c = [0.7000000000, 0, 0]) {
				translate(v = [0, 0, 1310.0000000000]) {
					linear_extrude(height = 180.0000000000) {
						polygon(paths = [[0, 1, 2, 3, 4, 5, 6, 7]], points = [[2675, 105], [2675, 995], [2400, 995], [2400, 1325], [2675, 1325], [2675, 2615], [2825, 2615], [2825, 105]]);
					}
				}
			}
			color(c = [0.1000000000, 0.1000000000, 0.1000000000]) {
				translate(v = [0, 0, 1490.0000000000]) {
					linear_extrude(height = 686.1000000000) {
						polygon(paths = [[0, 1, 2, 3]], points = [[2380, 295], [2380, 465], [2550, 465], [2550, 295]]);
					}
				}
			}
			color(c = [0.1000000000, 0.1000000000, 0.1000000000]) {
				translate(v = [0, 0, 1490.0000000000]) {
					linear_extrude(height = 686.1000000000) {
						polygon(paths = [[0, 1, 2, 3]], points = [[2875, 295], [2875, 465], [3045, 465], [3045, 295]]);
					}
				}
			}
			color(c = [0.1000000000, 0.1000000000, 0.1000000000]) {
				translate(v = [0, 0, 1490.0000000000]) {
					linear_extrude(height = 686.1000000000) {
						polygon(paths = [[0, 1, 2, 3]], points = [[175, 335], [175, 505], [345, 505], [345, 335]]);
					}
				}
			}
			color(c = [0.1000000000, 0.1000000000, 0.1000000000]) {
				translate(v = [0, 0, 1490.0000000000]) {
					linear_extrude(height = 686.1000000000) {
						polygon(paths = [[0, 1, 2, 3]], points = [[2380, 635], [2380, 805], [2550, 805], [2550, 635]]);
					}
				}
			}
			color(c = [0.1000000000, 0.1000000000, 0.1000000000]) {
				translate(v = [0, 0, 1490.0000000000]) {
					linear_extrude(height = 686.1000000000) {
						polygon(paths = [[0, 1, 2, 3]], points = [[2875, 635], [2875, 805], [3045, 805], [3045, 635]]);
					}
				}
			}
			color(c = [0.1000000000, 0.1000000000, 0.1000000000]) {
				translate(v = [0, 0, 1490.0000000000]) {
					linear_extrude(height = 686.1000000000) {
						polygon(paths = [[0, 1, 2, 3]], points = [[155, 1075], [155, 1245], [325, 1245], [325, 1075]]);
					}
				}
			}
			color(c = [0.1000000000, 0.1000000000, 0.1000000000]) {
				translate(v = [0, 0, 1490.0000000000]) {
					linear_extrude(height = 686.1000000000) {
						polygon(paths = [[0, 1, 2, 3]], points = [[885, 1075], [885, 1245], [1055, 1245], [1055, 1075]]);
					}
				}
			}
			color(c = [0.1000000000, 0.1000000000, 0.1000000000]) {
				translate(v = [0, 0, 1490.0000000000]) {
					linear_extrude(height = 686.1000000000) {
						polygon(paths = [[0, 1, 2, 3]], points = [[1415, 1075], [1415, 1245], [1585, 1245], [1585, 1075]]);
					}
				}
			}
			color(c = [0.1000000000, 0.1000000000, 0.1000000000]) {
				translate(v = [0, 0, 1490.0000000000]) {
					linear_extrude(height = 686.1000000000) {
						polygon(paths = [[0, 1, 2, 3]], points = [[1895, 1075], [1895, 1245], [2065, 1245], [2065, 1075]]);
					}
				}
			}
			color(c = [0.1000000000, 0.1000000000, 0.1000000000]) {
				translate(v = [0, 0, 1490.0000000000]) {
					linear_extrude(height = 686.1000000000) {
						polygon(paths = [[0, 1, 2, 3]], points = [[2450, 1075], [2450, 1245], [2620, 1245], [2620, 1075]]);
					}
				}
			}
			color(c = [0.1000000000, 0.1000000000, 0.1000000000]) {
				translate(v = [0, 0, 1490.0000000000]) {
					linear_extrude(height = 686.1000000000) {
						polygon(paths = [[0, 1, 2, 3]], points = [[2875, 1575], [2875, 1745], [3045, 1745], [3045, 1575]]);
					}
				}
			}
			color(c = [0.1000000000, 0.1000000000, 0.1000000000]) {
				translate(v = [0, 0, 1490.0000000000]) {
					linear_extrude(height = 686.1000000000) {
						polygon(paths = [[0, 1, 2, 3]], points = [[2375, 1915], [2375, 2085], [2545, 2085], [2545, 1915]]);
					}
				}
			}
			color(c = [0.1000000000, 0.1000000000, 0.1000000000]) {
				translate(v = [0, 0, 1490.0000000000]) {
					linear_extrude(height = 686.1000000000) {
						polygon(paths = [[0, 1, 2, 3]], points = [[2875, 1915], [2875, 2085], [3045, 2085], [3045, 1915]]);
					}
				}
			}
			color(c = [0.1000000000, 0.1000000000, 0.1000000000]) {
				translate(v = [0, 0, 1490.0000000000]) {
					linear_extrude(height = 686.1000000000) {
						polygon(paths = [[0, 1, 2, 3]], points = [[635, 2215], [635, 2385], [805, 2385], [805, 2215]]);
					}
				}
			}
			color(c = [0.1000000000, 0.1000000000, 0.1000000000]) {
				translate(v = [0, 0, 1490.0000000000]) {
					linear_extrude(height = 686.1000000000) {
						polygon(paths = [[0, 1, 2, 3]], points = [[1620, 2215], [1620, 2385], [1790, 2385], [1790, 2215]]);
					}
				}
			}
			color(c = [0.1000000000, 0.1000000000, 0.1000000000]) {
				translate(v = [0, 0, 1490.0000000000]) {
					linear_extrude(height = 686.1000000000) {
						polygon(paths = [[0, 1, 2, 3]], points = [[175, 2255], [175, 2425], [345, 2425], [345, 2255]]);
					}
				}
			}
			color(c = [0.1000000000, 0.1000000000, 0.1000000000]) {
				translate(v = [0, 0, 1490.0000000000]) {
					linear_extrude(height = 686.1000000000) {
						polygon(paths = [[0, 1, 2, 3]], points = [[1145, 2255], [1145, 2425], [1315, 2425], [1315, 2255]]);
					}
				}
			}
			color(c = [0.1000000000, 0.1000000000, 0.1000000000]) {
				translate(v = [0, 0, 1490.0000000000]) {
					linear_extrude(height = 686.1000000000) {
						polygon(paths = [[0, 1, 2, 3]], points = [[2375, 2255], [2375, 2425], [2545, 2425], [2545, 2255]]);
					}
				}
			}
			color(c = [0.1000000000, 0.1000000000, 0.1000000000]) {
				translate(v = [0, 0, 1490.0000000000]) {
					linear_extrude(height = 686.1000000000) {
						polygon(paths = [[0, 1, 2, 3]], points = [[2875, 2255], [2875, 2425], [3045, 2425], [3045, 2255]]);
					}
				}
			}
			color(c = [0.9000000000, 0.6000000000, 0.6000000000]) {
				translate(v = [0, 0, 2176.1000000000]) {
					linear_extrude(height = 100.0000000000) {
						polygon(paths = [[0, 1, 2, 3, 4, 5, 6, 7]], points = [[0, -85], [0, 85], [2355, 85], [2355, 885], [2625, 885], [2625, 85], [3220, 85], [3220, -85]]);
					}
				}
			}
			color(c = [0.9000000000, 0.6000000000, 0.6000000000]) {
				translate(v = [0, 0, 2176.1000000000]) {
					linear_extrude(height = 100.0000000000) {
						polygon(paths = [[0, 1, 2, 3]], points = [[885, 360], [885, 1325], [1235, 1325], [1235, 360]]);
					}
				}
			}
			color(c = [0.9000000000, 0.6000000000, 0.6000000000]) {
				translate(v = [0, 0, 2176.1000000000]) {
					linear_extrude(height = 100.0000000000) {
						polygon(paths = [[0, 1, 2, 3]], points = [[1415, 355], [1415, 1325], [1715, 1325], [1715, 355]]);
					}
				}
			}
			color(c = [0.9000000000, 0.6000000000, 0.6000000000]) {
				translate(v = [0, 0, 2176.1000000000]) {
					linear_extrude(height = 100.0000000000) {
						polygon(paths = [[0, 1, 2, 3]], points = [[1895, 355], [1895, 1325], [2175, 1325], [2175, 355]]);
					}
				}
			}
			color(c = [0.9000000000, 0.6000000000, 0.6000000000]) {
				translate(v = [0, 0, 2176.1000000000]) {
					linear_extrude(height = 100.0000000000) {
						polygon(paths = [[0, 1, 2, 3]], points = [[85, 765], [85, 2075], [325, 2075], [325, 765]]);
					}
				}
			}
			color(c = [0.9000000000, 0.6000000000, 0.6000000000]) {
				translate(v = [0, 0, 2176.1000000000]) {
					linear_extrude(height = 100.0000000000) {
						polygon(paths = [[0, 1, 2, 3, 4, 5, 6, 7, 8, 9, 10, 11, 12, 13, 14, 15, 16, 17, 18, 19]], points = [[170, 255], [170, 585], [495, 585], [495, 1665], [595, 1665], [595, 2465], [845, 2465], [845, 1665], [1580, 1665], [1580, 2465], [1830, 2465], [1830, 1665], [2685, 1665], [2685, 1325], [2700, 1325], [2700, 1075], [2370, 1075], [2370, 1495], [665, 1495], [665, 255]]);
					}
				}
			}
			color(c = [0.9000000000, 0.6000000000, 0.6000000000]) {
				translate(v = [0, 0, 2176.1000000000]) {
					linear_extrude(height = 100.0000000000) {
						polygon(paths = [[0, 1, 2, 3, 4, 5, 6, 7]], points = [[2795, 295], [2795, 805], [2875, 805], [2875, 2205], [2795, 2205], [2795, 2465], [3135, 2465], [3135, 295]]);
					}
				}
			}
			color(c = [0.9000000000, 0.6000000000, 0.6000000000]) {
				translate(v = [0, 0, 2176.1000000000]) {
					linear_extrude(height = 100.0000000000) {
						polygon(paths = [[0, 1, 2, 3, 4, 5, 6, 7, 8, 9, 10, 11, 12, 13, 14, 15]], points = [[2295, 1835], [2295, 2635], [1395, 2635], [1395, 1915], [1065, 1915], [1065, 2635], [425, 2635], [425, 2255], [90, 2255], [90, 2635], [0, 2635], [0, 2805], [3220, 2805], [3220, 2635], [2625, 2635], [2625, 1835]]);
					}
				}
			}
			color(c = [0.5000000000, 0.5000000000, 0.5000000000]) {
				translate(v = [0, 0, 2276.1000000000]) {
					linear_extrude(height = 340.0000000000) {
						polygon(paths = [[0, 1, 2, 3]], points = [[145, -85], [145, 85], [315, 85], [315, -85]]);
					}
				}
			}
			color(c = [0.5000000000, 0.5000000000, 0.5000000000]) {
				translate(v = [0, 0, 2276.1000000000]) {
					linear_extrude(height = 340.0000000000) {
						polygon(paths = [[0, 1, 2, 3]], points = [[605, -85], [605, 85], [775, 85], [775, -85]]);
					}
				}
			}
			color(c = [0.5000000000, 0.5000000000, 0.5000000000]) {
				translate(v = [0, 0, 2276.1000000000]) {
					linear_extrude(height = 340.0000000000) {
						polygon(paths = [[0, 1, 2, 3]], points = [[1065, -85], [1065, 85], [1235, 85], [1235, -85]]);
					}
				}
			}
			color(c = [0.5000000000, 0.5000000000, 0.5000000000]) {
				translate(v = [0, 0, 2276.1000000000]) {
					linear_extrude(height = 340.0000000000) {
						polygon(paths = [[0, 1, 2, 3]], points = [[1525, -85], [1525, 85], [1695, 85], [1695, -85]]);
					}
				}
			}
			color(c = [0.5000000000, 0.5000000000, 0.5000000000]) {
				translate(v = [0, 0, 2276.1000000000]) {
					linear_extrude(height = 340.0000000000) {
						polygon(paths = [[0, 1, 2, 3]], points = [[1985, -85], [1985, 85], [2155, 85], [2155, -85]]);
					}
				}
			}
			color(c = [0.5000000000, 0.5000000000, 0.5000000000]) {
				translate(v = [0, 0, 2276.1000000000]) {
					linear_extrude(height = 340.0000000000) {
						polygon(paths = [[0, 1, 2, 3]], points = [[2445, -85], [2445, 85], [2615, 85], [2615, -85]]);
					}
				}
			}
			color(c = [0.5000000000, 0.5000000000, 0.5000000000]) {
				translate(v = [0, 0, 2276.1000000000]) {
					linear_extrude(height = 340.0000000000) {
						polygon(paths = [[0, 1, 2, 3]], points = [[2905, -85], [2905, 85], [3075, 85], [3075, -85]]);
					}
				}
			}
			color(c = [0.5000000000, 0.5000000000, 0.5000000000]) {
				translate(v = [0, 0, 2276.1000000000]) {
					linear_extrude(height = 340.0000000000) {
						polygon(paths = [[0, 1, 2, 3]], points = [[145, 2635], [145, 2805], [315, 2805], [315, 2635]]);
					}
				}
			}
			color(c = [0.5000000000, 0.5000000000, 0.5000000000]) {
				translate(v = [0, 0, 2276.1000000000]) {
					linear_extrude(height = 340.0000000000) {
						polygon(paths = [[0, 1, 2, 3]], points = [[605, 2635], [605, 2805], [775, 2805], [775, 2635]]);
					}
				}
			}
			color(c = [0.5000000000, 0.5000000000, 0.5000000000]) {
				translate(v = [0, 0, 2276.1000000000]) {
					linear_extrude(height = 340.0000000000) {
						polygon(paths = [[0, 1, 2, 3]], points = [[1065, 2635], [1065, 2805], [1235, 2805], [1235, 2635]]);
					}
				}
			}
			color(c = [0.5000000000, 0.5000000000, 0.5000000000]) {
				translate(v = [0, 0, 2276.1000000000]) {
					linear_extrude(height = 340.0000000000) {
						polygon(paths = [[0, 1, 2, 3]], points = [[1525, 2635], [1525, 2805], [1695, 2805], [1695, 2635]]);
					}
				}
			}
			color(c = [0.5000000000, 0.5000000000, 0.5000000000]) {
				translate(v = [0, 0, 2276.1000000000]) {
					linear_extrude(height = 340.0000000000) {
						polygon(paths = [[0, 1, 2, 3]], points = [[1985, 2635], [1985, 2805], [2155, 2805], [2155, 2635]]);
					}
				}
			}
			color(c = [0.5000000000, 0.5000000000, 0.5000000000]) {
				translate(v = [0, 0, 2276.1000000000]) {
					linear_extrude(height = 340.0000000000) {
						polygon(paths = [[0, 1, 2, 3]], points = [[2445, 2635], [2445, 2805], [2615, 2805], [2615, 2635]]);
					}
				}
			}
			color(c = [0.5000000000, 0.5000000000, 0.5000000000]) {
				translate(v = [0, 0, 2276.1000000000]) {
					linear_extrude(height = 340.0000000000) {
						polygon(paths = [[0, 1, 2, 3]], points = [[2905, 2635], [2905, 2805], [3075, 2805], [3075, 2635]]);
					}
				}
			}
			color(c = [0.3000000000, 0.3000000000, 1]) {
				translate(v = [0, 0, 2616.1000000000]) {
					linear_extrude(height = 360.0000000000) {
						polygon(paths = [[0, 1, 2, 3]], points = [[0, -240], [0, 240], [3220, 240], [3220, -240]]);
					}
				}
			}
			color(c = [0.3000000000, 0.3000000000, 1]) {
				translate(v = [0, 0, 2616.1000000000]) {
					linear_extrude(height = 360.0000000000) {
						polygon(paths = [[0, 1, 2, 3]], points = [[0, 2480], [0, 2960], [3220, 2960], [3220, 2480]]);
					}
				}
			}
		}
	}
}
